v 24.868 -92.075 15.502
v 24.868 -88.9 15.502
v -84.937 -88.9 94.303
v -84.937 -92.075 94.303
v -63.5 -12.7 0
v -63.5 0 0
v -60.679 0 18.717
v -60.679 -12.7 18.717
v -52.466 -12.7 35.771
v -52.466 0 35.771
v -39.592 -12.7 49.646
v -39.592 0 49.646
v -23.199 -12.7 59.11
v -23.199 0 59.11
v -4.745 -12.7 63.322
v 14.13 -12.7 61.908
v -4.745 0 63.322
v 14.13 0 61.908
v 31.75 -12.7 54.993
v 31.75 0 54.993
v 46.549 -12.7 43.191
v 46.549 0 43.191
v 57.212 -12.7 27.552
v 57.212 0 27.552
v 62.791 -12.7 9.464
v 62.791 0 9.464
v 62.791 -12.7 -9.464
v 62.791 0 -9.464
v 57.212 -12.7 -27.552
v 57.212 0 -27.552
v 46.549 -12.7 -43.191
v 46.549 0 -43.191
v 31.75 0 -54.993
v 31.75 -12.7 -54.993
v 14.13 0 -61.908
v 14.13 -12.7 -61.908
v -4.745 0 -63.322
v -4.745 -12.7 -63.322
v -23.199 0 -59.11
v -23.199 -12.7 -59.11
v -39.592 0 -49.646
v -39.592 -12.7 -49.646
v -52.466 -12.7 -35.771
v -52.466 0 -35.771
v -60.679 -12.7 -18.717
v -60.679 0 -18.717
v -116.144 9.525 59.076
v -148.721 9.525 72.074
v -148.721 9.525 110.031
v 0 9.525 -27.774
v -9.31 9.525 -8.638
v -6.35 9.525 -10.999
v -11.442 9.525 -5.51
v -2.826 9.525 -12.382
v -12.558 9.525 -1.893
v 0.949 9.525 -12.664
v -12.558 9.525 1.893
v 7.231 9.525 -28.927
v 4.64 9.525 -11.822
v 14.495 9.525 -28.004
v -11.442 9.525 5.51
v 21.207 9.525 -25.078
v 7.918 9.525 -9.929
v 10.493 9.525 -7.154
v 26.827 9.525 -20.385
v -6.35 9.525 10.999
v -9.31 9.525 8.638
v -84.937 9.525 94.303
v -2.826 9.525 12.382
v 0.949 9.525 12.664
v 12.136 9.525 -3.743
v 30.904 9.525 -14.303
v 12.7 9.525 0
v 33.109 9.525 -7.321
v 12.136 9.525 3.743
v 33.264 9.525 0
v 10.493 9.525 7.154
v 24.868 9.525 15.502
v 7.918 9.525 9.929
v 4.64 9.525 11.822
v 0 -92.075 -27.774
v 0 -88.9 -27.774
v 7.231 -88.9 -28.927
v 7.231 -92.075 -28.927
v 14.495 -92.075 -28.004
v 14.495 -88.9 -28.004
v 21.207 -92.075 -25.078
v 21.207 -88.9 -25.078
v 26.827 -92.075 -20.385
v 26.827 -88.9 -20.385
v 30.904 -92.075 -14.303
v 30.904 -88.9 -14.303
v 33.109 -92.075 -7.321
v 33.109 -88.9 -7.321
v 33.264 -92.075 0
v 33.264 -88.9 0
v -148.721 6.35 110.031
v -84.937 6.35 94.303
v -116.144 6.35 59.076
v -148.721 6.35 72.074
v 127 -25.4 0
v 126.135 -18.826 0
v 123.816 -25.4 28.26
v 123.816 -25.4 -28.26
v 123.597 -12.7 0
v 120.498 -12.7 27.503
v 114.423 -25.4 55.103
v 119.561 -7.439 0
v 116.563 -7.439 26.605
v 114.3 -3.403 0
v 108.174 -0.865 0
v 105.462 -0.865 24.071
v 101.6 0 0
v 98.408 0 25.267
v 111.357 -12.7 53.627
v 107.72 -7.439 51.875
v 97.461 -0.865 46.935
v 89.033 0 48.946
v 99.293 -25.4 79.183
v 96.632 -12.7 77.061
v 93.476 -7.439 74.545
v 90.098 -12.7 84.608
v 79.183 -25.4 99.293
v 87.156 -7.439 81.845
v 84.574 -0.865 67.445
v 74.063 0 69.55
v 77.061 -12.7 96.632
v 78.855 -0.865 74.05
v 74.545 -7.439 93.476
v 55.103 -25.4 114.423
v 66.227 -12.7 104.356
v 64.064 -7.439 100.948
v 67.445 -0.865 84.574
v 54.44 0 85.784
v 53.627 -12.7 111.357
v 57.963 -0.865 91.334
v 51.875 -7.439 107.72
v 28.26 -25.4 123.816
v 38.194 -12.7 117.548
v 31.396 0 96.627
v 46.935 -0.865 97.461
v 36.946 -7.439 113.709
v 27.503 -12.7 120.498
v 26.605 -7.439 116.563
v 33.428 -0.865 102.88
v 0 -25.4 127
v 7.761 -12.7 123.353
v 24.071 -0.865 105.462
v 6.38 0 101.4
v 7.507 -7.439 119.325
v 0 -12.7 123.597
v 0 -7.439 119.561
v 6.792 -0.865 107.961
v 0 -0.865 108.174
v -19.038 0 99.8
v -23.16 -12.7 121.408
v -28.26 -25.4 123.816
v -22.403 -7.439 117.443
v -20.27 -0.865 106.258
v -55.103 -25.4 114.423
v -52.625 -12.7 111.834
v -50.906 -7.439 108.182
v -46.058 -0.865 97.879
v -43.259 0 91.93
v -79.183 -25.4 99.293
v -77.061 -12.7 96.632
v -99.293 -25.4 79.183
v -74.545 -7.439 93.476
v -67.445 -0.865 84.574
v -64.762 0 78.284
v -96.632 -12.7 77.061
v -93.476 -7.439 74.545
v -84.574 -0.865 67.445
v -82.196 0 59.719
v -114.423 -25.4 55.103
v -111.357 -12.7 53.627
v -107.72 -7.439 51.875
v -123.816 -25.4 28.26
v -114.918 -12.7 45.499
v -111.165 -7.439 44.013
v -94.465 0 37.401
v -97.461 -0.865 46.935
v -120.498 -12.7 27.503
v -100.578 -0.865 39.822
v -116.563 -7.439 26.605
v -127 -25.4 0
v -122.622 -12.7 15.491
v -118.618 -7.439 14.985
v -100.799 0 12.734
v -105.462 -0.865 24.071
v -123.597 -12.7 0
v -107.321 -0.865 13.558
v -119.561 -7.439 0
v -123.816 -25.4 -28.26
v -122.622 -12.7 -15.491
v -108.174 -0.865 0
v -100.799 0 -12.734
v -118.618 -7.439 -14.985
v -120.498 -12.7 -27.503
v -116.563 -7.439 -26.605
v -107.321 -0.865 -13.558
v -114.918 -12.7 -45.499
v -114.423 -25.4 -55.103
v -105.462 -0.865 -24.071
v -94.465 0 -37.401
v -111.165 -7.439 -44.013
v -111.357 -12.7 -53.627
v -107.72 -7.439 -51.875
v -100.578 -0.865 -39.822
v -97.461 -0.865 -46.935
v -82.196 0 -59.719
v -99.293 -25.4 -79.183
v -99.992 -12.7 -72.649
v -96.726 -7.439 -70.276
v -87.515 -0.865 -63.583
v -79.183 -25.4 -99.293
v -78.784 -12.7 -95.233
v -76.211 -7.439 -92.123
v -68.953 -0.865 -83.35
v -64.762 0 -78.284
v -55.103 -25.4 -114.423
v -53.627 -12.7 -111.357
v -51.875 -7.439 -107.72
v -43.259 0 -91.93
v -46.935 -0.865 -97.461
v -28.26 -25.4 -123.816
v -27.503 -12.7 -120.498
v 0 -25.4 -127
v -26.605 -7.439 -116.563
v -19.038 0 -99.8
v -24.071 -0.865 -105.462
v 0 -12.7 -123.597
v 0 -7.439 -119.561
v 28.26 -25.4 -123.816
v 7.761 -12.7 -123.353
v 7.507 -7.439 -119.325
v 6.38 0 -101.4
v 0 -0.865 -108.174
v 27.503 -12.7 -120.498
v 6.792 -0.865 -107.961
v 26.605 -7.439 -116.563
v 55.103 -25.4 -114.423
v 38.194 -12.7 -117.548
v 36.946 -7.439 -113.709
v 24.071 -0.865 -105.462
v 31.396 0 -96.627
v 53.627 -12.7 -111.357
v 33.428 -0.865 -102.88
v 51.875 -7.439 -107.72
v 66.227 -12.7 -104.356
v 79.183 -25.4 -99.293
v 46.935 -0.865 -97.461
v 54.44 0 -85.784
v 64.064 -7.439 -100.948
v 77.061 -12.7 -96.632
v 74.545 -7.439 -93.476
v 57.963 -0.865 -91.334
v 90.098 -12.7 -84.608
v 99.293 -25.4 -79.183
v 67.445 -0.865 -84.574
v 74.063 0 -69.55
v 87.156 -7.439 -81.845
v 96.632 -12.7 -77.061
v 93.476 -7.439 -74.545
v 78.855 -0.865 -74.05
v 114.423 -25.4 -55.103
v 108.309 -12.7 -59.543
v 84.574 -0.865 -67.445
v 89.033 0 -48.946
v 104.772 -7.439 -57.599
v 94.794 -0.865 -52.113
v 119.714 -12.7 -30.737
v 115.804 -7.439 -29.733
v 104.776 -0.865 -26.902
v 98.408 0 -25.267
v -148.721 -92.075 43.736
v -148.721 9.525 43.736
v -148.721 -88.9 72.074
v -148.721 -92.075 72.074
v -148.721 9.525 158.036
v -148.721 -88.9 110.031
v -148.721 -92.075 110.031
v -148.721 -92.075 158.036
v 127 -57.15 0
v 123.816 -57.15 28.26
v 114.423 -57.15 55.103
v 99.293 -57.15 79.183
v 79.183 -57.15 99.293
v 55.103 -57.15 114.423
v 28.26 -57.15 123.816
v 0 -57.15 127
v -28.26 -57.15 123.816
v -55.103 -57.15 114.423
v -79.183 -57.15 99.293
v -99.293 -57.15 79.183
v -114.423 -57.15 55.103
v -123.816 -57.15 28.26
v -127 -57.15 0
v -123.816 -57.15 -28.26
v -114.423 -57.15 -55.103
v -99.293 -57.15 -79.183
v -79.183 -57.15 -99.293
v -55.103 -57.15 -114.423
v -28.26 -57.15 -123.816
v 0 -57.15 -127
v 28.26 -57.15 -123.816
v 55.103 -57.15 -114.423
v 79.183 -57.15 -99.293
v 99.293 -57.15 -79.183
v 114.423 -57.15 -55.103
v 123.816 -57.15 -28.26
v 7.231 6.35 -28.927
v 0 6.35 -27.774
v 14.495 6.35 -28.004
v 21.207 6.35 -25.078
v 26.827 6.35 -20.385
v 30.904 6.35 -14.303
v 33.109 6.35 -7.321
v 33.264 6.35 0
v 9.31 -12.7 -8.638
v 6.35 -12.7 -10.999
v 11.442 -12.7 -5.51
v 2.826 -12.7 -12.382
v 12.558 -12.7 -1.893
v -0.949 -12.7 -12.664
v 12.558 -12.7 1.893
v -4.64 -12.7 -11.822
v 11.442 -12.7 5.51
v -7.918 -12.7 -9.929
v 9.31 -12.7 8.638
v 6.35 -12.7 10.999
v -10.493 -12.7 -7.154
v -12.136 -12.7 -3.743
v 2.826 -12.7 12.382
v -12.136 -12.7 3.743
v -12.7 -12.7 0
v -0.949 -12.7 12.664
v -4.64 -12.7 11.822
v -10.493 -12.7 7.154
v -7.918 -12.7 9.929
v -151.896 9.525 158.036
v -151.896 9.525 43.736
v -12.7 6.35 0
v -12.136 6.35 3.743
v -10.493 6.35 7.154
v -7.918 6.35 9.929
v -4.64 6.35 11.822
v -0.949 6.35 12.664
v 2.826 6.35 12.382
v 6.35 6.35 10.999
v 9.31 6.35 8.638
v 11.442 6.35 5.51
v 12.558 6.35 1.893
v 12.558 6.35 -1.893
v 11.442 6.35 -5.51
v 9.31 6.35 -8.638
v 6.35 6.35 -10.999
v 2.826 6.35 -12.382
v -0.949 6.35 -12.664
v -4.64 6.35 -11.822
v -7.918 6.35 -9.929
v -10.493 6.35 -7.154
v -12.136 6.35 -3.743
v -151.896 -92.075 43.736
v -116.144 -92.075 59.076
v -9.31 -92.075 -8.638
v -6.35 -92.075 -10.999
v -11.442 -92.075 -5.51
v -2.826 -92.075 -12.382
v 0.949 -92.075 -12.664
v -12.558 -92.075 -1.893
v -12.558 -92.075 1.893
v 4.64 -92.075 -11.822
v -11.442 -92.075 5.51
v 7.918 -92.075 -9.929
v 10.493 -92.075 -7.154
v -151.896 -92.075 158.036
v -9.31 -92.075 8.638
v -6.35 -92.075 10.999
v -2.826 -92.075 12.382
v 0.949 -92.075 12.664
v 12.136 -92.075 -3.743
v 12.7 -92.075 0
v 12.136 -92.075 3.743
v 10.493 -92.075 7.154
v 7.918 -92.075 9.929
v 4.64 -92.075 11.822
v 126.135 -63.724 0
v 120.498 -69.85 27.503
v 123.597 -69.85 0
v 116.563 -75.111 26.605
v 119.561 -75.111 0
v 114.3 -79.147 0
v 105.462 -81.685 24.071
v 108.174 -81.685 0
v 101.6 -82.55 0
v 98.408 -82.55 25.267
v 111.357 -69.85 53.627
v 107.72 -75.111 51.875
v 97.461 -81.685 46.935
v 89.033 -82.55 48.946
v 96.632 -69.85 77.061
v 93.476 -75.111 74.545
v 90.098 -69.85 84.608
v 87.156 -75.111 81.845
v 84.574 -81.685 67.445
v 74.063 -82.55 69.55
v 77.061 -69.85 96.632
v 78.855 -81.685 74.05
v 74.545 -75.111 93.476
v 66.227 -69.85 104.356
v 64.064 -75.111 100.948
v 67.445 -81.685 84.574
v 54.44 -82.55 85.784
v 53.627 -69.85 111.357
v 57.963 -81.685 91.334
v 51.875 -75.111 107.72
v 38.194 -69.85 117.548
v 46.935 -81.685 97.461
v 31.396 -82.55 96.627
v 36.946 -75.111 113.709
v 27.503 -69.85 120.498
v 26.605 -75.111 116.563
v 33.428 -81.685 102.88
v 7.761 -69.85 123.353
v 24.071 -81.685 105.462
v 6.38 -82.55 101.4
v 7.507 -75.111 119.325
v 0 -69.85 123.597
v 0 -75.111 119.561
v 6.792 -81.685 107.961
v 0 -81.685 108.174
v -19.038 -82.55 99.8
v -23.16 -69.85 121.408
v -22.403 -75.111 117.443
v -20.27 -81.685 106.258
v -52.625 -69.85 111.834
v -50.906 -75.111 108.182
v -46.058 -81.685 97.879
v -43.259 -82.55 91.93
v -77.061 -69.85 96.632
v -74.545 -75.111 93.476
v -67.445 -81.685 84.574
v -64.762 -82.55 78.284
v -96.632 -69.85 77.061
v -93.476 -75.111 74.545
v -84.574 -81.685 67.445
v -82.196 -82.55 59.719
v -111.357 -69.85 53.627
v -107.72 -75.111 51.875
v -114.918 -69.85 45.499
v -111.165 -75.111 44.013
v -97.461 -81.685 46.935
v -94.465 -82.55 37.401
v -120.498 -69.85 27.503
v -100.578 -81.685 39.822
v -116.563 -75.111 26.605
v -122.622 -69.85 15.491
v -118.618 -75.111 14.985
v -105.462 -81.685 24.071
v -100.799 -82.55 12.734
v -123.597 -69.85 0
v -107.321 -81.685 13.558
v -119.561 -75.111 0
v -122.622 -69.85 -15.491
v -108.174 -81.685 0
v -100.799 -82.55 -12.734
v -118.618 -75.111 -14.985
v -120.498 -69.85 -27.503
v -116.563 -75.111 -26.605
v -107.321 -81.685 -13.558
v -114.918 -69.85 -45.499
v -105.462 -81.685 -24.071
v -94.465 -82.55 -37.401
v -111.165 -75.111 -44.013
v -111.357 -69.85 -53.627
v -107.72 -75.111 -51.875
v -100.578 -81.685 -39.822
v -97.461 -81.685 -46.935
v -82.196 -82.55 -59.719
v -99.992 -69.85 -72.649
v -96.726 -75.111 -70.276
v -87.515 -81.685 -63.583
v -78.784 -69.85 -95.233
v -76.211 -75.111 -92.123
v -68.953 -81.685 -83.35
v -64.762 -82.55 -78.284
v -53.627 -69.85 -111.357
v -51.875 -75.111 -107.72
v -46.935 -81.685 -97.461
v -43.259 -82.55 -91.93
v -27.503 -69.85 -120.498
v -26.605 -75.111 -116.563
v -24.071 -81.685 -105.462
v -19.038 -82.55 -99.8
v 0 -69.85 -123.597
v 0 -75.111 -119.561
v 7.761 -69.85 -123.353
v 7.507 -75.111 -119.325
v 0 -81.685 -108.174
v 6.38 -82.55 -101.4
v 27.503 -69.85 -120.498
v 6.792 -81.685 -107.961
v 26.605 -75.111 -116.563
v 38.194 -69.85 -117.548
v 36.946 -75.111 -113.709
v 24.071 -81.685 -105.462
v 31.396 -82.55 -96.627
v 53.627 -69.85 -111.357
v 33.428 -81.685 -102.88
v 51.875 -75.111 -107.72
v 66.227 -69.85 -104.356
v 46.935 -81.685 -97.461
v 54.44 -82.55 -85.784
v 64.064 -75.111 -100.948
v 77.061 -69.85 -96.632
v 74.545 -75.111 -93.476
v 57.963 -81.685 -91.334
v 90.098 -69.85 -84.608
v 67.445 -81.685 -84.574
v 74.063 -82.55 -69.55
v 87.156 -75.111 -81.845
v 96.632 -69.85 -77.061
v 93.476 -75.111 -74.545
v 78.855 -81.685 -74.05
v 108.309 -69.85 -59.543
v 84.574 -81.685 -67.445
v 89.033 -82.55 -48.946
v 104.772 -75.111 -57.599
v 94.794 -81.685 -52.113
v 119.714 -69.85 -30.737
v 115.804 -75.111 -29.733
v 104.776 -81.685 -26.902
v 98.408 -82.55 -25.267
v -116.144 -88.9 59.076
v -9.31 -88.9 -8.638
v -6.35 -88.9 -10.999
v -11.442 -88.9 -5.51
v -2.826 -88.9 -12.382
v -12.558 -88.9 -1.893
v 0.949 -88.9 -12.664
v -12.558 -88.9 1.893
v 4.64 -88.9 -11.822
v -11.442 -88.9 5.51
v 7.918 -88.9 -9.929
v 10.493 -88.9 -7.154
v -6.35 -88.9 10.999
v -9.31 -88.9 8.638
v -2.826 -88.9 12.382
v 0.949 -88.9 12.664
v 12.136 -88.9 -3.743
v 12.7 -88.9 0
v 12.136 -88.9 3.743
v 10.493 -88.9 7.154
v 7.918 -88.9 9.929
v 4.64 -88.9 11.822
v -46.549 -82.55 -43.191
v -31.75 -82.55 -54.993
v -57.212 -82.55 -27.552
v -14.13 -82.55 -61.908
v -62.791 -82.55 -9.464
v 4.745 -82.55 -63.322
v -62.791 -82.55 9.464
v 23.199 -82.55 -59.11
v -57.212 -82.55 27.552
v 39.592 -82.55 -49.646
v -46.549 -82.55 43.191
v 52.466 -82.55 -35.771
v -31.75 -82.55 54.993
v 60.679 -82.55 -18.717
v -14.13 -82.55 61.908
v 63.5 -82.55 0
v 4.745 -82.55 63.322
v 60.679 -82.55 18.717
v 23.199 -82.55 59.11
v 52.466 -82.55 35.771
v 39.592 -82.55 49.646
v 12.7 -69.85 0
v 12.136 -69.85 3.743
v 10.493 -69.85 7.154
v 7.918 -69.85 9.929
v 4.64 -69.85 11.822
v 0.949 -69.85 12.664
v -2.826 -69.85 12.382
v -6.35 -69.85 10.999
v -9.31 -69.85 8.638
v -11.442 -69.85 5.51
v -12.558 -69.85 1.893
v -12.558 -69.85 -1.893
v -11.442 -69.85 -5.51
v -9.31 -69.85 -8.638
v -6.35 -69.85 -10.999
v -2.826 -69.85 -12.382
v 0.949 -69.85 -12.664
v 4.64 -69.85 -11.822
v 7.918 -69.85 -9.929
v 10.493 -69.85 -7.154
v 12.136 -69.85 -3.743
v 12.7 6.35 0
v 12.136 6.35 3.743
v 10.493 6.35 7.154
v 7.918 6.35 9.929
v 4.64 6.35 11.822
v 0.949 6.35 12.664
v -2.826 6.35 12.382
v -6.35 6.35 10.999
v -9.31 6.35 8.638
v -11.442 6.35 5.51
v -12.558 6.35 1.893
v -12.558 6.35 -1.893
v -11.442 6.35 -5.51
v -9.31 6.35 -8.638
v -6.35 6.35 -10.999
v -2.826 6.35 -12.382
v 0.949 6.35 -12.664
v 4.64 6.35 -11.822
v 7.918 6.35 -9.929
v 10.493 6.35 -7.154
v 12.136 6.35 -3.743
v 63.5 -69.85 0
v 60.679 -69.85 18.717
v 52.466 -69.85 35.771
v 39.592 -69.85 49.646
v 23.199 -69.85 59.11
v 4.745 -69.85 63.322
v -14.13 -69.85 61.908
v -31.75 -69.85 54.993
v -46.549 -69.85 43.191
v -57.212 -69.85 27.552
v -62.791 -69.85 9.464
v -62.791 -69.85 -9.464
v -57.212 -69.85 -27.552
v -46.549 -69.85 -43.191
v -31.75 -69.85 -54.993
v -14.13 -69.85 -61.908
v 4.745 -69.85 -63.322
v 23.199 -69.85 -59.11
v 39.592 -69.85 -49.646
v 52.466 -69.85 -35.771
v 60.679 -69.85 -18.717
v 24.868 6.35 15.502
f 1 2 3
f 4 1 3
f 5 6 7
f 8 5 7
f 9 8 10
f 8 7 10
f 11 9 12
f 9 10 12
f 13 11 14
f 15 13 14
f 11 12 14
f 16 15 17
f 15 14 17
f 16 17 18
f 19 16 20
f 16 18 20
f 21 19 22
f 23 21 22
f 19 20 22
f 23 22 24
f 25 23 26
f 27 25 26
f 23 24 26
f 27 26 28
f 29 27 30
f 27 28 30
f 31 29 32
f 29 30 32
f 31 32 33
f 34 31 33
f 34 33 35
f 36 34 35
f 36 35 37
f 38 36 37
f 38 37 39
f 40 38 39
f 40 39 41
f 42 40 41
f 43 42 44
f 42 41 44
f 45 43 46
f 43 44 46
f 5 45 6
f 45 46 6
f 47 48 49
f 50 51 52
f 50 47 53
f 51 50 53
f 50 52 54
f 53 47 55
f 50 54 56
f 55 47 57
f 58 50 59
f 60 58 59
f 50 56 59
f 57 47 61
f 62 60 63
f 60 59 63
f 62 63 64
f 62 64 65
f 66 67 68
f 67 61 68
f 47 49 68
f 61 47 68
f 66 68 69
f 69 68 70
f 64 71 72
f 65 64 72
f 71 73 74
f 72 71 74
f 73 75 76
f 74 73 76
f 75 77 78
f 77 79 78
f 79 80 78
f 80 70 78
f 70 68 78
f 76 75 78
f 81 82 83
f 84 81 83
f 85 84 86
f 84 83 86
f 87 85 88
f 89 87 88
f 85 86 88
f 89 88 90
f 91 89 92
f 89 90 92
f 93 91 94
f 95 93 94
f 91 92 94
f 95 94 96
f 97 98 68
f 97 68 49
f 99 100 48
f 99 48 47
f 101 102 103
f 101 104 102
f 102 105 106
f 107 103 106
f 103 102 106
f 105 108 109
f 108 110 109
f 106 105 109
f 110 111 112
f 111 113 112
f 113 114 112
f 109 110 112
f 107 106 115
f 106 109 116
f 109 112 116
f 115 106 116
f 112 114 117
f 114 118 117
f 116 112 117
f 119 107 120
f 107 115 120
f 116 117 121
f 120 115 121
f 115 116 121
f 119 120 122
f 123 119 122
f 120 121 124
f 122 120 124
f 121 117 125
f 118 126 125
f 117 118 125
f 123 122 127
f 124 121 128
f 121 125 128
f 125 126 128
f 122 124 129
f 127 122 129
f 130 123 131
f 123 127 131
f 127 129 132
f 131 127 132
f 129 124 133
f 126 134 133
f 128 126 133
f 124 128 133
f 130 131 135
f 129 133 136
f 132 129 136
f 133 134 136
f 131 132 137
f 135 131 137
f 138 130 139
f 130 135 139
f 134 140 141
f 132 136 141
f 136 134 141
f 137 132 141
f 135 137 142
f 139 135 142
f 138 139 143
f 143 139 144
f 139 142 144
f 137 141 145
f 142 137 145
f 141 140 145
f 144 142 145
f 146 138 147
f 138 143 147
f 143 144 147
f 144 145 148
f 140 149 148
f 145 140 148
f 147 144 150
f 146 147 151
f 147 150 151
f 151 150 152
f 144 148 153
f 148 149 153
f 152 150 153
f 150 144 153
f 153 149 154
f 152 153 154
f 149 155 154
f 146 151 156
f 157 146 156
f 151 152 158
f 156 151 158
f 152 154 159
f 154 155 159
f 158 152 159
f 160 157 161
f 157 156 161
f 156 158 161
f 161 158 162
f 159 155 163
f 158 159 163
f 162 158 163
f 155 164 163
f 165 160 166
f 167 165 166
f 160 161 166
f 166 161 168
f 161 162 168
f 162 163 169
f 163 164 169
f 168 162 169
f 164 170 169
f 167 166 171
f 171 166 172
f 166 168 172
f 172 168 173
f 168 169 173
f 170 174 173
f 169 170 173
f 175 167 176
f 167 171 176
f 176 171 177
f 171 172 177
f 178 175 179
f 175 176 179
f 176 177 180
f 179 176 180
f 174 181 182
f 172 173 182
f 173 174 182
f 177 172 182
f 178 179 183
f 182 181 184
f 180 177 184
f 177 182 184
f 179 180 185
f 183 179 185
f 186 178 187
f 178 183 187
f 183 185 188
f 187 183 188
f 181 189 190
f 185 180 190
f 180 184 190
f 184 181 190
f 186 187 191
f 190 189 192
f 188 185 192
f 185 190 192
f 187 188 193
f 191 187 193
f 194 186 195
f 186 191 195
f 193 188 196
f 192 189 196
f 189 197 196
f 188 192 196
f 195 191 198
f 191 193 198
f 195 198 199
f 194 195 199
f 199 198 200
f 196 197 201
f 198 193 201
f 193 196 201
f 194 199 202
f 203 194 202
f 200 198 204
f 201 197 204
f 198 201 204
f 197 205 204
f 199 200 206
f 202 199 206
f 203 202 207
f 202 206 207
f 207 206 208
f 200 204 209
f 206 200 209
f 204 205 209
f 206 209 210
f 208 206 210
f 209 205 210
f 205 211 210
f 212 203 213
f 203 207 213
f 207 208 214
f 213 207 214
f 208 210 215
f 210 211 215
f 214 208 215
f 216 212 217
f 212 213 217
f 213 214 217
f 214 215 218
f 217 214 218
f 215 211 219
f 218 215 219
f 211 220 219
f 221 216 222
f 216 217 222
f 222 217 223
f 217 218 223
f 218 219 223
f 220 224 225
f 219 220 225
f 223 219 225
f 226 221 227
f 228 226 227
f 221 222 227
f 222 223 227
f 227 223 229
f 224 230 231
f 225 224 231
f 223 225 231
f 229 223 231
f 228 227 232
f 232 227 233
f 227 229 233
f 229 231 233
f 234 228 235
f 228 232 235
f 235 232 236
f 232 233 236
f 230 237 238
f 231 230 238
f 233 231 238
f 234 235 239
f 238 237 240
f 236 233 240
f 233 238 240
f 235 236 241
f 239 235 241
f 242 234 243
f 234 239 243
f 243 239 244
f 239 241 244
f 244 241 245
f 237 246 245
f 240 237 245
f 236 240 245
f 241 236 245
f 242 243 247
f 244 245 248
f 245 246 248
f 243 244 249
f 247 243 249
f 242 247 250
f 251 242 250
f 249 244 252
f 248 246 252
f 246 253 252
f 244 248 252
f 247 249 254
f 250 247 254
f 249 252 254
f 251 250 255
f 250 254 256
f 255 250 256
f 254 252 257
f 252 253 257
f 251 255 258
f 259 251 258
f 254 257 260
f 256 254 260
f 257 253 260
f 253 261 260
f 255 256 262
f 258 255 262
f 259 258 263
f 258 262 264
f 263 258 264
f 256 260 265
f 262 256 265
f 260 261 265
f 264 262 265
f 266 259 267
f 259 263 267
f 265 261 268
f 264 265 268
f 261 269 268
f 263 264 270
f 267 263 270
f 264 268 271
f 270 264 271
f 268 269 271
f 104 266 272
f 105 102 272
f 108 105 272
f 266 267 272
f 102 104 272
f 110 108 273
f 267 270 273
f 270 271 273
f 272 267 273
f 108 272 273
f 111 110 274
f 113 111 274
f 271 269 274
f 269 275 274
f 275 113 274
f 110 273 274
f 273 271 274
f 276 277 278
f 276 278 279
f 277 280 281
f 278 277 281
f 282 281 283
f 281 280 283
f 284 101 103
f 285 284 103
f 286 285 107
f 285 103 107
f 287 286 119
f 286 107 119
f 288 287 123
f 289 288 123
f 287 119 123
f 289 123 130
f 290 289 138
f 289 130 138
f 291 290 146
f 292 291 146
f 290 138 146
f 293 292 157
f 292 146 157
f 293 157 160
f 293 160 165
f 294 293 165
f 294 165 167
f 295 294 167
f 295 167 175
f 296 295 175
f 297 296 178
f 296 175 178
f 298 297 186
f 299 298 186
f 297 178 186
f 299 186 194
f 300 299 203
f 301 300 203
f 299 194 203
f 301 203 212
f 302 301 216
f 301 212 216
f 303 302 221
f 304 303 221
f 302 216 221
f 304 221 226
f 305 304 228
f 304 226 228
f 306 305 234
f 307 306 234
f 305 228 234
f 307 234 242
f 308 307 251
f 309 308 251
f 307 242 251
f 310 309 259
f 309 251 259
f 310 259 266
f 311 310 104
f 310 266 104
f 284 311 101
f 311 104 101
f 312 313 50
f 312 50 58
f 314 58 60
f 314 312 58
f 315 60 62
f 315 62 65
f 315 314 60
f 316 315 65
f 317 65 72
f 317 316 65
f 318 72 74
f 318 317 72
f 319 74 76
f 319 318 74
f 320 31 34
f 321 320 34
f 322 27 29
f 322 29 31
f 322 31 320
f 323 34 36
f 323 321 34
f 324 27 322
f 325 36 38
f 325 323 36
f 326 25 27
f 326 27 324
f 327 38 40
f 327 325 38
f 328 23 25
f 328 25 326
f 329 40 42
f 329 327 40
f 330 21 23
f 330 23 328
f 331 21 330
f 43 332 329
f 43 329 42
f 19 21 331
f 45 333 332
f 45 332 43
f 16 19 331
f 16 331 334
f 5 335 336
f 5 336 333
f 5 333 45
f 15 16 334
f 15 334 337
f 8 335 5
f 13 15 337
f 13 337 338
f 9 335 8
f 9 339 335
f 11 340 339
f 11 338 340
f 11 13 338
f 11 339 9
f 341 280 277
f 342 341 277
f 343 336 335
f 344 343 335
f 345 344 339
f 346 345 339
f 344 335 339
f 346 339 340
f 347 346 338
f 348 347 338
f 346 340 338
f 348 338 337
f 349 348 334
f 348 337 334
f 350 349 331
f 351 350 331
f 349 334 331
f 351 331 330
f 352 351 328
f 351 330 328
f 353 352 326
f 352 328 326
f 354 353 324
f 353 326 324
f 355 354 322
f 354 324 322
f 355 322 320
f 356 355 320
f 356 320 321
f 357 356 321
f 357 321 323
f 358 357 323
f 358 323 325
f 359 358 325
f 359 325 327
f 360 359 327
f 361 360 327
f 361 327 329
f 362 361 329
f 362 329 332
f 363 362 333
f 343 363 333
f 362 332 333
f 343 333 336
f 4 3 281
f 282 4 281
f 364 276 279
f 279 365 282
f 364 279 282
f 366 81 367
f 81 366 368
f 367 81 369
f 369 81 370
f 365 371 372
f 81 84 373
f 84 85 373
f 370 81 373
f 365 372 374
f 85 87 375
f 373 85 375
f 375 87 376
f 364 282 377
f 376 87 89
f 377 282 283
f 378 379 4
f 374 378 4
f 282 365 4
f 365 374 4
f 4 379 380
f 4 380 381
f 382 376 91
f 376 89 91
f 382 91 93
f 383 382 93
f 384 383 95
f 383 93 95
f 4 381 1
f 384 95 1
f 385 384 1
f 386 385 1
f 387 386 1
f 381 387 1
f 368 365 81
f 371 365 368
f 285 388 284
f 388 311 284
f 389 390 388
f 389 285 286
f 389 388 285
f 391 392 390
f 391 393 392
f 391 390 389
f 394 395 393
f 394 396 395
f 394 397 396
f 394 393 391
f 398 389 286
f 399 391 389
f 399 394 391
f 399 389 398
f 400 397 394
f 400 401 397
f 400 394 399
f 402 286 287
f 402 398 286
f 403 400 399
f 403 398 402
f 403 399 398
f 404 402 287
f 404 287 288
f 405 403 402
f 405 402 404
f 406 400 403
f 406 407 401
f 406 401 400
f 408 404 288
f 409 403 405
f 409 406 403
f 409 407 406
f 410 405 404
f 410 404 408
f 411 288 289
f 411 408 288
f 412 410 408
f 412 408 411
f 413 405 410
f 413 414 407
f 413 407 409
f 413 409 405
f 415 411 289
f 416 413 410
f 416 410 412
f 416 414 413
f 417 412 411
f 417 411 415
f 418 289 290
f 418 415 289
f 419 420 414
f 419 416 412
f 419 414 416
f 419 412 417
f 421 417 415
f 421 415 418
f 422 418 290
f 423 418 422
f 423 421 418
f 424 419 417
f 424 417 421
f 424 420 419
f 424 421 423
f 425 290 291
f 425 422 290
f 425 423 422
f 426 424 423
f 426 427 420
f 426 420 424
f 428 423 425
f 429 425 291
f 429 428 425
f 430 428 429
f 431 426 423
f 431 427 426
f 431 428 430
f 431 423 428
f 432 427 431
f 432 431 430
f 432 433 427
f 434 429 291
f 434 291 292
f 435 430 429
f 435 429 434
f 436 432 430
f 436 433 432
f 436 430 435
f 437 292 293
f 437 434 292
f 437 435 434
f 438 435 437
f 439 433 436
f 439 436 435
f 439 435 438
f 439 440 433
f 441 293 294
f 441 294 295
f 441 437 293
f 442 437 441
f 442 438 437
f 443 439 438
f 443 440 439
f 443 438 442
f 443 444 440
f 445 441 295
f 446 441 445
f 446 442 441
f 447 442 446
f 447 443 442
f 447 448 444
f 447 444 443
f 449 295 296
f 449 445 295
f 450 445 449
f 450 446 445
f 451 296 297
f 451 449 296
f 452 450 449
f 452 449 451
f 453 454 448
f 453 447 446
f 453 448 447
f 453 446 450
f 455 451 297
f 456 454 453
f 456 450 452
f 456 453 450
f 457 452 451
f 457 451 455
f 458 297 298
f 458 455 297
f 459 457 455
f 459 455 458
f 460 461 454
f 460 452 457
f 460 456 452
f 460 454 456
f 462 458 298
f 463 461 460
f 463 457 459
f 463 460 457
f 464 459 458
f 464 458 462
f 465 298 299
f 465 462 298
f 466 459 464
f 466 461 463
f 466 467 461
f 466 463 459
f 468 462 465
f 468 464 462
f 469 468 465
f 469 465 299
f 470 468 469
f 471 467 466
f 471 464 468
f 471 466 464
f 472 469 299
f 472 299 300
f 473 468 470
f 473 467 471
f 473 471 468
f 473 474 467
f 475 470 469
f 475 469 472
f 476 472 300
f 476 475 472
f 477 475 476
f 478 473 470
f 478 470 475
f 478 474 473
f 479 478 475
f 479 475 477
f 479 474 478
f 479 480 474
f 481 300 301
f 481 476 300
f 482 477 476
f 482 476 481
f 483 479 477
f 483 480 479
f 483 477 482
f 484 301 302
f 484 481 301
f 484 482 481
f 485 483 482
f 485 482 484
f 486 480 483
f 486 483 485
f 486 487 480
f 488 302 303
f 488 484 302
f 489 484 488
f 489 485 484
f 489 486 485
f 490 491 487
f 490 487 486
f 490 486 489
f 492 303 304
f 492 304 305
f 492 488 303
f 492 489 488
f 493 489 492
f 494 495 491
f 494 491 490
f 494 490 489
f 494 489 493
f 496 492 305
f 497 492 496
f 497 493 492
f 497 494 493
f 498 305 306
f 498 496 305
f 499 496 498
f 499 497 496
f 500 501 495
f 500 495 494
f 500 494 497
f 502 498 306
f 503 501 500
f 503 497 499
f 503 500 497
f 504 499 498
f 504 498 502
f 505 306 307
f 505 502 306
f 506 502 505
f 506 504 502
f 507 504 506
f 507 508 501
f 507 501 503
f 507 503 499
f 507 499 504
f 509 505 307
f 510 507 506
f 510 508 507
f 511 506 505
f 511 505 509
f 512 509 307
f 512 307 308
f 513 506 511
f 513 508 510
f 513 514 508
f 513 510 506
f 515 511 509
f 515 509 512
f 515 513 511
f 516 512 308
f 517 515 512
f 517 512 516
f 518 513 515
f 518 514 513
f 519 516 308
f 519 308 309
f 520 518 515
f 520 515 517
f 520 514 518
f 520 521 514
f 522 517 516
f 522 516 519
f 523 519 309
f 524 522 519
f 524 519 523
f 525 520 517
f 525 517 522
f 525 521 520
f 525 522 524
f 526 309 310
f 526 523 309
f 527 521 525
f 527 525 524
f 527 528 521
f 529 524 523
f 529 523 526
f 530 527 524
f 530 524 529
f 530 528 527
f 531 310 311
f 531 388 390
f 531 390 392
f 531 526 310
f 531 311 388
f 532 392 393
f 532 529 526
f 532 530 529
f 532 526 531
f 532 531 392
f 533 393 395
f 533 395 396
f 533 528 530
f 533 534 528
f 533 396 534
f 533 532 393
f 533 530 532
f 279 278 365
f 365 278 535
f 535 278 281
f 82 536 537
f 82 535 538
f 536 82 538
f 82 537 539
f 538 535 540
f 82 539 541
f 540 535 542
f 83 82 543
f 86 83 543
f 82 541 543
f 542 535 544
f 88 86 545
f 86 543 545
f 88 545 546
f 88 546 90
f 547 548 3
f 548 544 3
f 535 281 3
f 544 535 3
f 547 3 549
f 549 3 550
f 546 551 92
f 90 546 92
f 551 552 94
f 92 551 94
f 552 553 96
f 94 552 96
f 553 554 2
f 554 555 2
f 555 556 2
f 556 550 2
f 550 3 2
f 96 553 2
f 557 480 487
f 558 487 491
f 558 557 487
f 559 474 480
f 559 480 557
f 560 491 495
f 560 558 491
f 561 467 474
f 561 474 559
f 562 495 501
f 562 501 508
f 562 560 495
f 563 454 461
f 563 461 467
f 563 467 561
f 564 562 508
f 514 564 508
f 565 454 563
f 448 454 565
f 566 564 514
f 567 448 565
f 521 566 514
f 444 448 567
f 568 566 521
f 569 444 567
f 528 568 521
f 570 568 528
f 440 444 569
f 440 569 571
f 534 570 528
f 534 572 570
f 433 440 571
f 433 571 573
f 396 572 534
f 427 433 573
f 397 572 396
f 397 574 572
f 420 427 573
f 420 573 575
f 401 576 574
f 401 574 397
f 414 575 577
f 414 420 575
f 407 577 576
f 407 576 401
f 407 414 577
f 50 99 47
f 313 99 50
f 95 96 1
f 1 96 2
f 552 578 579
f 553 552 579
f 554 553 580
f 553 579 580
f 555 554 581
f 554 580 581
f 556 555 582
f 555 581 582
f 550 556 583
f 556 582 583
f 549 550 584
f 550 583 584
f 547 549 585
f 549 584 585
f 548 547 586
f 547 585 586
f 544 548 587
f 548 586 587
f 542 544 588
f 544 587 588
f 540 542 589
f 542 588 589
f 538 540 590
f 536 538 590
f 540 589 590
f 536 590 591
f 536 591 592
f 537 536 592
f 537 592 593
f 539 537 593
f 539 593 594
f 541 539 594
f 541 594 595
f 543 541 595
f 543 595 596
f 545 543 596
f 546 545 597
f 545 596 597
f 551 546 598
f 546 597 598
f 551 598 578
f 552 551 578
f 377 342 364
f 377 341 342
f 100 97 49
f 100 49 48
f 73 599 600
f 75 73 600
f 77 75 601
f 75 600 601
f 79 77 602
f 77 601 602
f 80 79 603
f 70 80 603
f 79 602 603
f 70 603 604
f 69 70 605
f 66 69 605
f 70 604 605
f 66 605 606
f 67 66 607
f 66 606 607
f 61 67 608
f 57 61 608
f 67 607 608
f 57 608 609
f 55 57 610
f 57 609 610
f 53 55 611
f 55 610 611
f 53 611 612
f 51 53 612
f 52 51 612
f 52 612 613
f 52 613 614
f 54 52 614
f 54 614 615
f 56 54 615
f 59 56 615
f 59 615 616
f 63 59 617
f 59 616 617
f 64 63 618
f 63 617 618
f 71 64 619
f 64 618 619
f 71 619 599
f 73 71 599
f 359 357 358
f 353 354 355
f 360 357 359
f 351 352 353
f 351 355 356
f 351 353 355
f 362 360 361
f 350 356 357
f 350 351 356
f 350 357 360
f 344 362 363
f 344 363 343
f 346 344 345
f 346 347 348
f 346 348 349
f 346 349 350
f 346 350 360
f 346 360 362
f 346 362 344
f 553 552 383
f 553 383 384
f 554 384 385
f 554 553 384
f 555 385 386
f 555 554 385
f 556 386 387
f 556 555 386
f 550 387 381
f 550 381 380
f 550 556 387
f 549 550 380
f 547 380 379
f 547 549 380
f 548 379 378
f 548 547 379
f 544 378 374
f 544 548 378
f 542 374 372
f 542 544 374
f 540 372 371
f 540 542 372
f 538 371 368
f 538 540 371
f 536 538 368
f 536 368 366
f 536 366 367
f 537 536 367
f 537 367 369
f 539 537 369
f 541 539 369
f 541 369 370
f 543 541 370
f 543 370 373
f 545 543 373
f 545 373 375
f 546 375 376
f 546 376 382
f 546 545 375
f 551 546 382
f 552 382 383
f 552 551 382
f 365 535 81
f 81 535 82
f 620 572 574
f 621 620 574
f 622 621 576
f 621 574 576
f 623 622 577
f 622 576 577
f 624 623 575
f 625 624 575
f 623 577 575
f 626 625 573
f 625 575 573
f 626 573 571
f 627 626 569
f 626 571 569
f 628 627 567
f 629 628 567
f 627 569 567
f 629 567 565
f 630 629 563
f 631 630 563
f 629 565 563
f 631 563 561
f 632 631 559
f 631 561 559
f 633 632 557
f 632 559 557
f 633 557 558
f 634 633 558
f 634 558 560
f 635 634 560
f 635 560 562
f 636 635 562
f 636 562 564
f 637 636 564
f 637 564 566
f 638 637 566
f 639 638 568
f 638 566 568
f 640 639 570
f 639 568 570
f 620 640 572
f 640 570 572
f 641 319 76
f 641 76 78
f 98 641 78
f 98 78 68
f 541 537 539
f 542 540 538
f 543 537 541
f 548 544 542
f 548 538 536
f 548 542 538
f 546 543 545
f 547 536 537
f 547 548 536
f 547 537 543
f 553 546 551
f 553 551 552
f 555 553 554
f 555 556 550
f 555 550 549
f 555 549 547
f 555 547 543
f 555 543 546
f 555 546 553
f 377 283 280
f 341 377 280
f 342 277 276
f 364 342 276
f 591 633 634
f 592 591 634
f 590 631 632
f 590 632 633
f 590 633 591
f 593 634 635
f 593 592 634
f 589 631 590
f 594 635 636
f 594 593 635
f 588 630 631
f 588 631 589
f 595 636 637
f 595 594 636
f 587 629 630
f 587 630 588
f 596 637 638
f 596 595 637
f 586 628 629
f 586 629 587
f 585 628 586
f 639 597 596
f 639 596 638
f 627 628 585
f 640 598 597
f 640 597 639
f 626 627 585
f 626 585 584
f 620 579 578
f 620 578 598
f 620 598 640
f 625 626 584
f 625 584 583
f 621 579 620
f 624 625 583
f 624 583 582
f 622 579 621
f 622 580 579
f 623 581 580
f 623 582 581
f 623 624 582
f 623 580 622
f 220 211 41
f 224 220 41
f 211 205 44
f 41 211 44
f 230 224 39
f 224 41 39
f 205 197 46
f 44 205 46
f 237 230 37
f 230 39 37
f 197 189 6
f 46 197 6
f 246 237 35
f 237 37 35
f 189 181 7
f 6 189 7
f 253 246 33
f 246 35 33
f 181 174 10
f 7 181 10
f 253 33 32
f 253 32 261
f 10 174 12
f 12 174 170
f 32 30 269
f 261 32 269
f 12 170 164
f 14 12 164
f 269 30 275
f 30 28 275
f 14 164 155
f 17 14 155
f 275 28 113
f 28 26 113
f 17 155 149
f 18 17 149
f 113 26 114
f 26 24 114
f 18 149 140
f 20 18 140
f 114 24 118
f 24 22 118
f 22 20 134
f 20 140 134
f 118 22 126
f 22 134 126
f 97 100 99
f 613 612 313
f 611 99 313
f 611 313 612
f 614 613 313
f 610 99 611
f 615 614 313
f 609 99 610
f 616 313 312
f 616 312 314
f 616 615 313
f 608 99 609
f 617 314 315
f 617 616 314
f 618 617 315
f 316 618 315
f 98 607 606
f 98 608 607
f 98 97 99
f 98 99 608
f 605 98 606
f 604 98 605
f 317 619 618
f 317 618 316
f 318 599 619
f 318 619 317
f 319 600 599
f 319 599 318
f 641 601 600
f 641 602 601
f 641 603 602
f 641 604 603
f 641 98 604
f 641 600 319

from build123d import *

# Parameters (mm, degrees)
F0_R      = 127
F1_DEPTH  = 82.55
F2_R      = 25.4
F3_R      = 63.5
F4_DEPTH  = 12.7
F5_R      = 63.5
F7_DEPTH  = 12.7
F8_R      = 12.7
F9_DEPTH  = 19.05
F10_R     = 12.7
F11_DEPTH = 19.05
F12_R     = 12.7
F13_DEPTH = 3.175
F15_W     = 3.175
F15_H     = 37.9564044358
F16_DEPTH = 3.175


# Not quite as in the source:
# - a length typed as a fraction of an inch, garbled in the dataset ("3 / 203.2 mm" for 3/8 in), is restored


with BuildPart() as f1:
    # F0 (on Front) → F1 (new body)
    with BuildSketch(Plane.XZ):
        Circle(F0_R)
    extrude(amount=F1_DEPTH)

    # F2
    f2_edges = [f1.edges().sort_by_distance(p)[0] for p in [
        (-127, 0, 0),
        (-127, -82.55, 0),
    ]]
    fillet(f2_edges, radius=F2_R)

    # F3 (on face) → F4 (cut)
    with BuildSketch(Plane.XZ.offset(82.55)):
        Circle(F3_R)
    extrude(amount=-F4_DEPTH, mode=Mode.SUBTRACT)

    # F5 (on face) → F7 (cut)
    with BuildSketch(Plane(origin=(0, 0, 0), x_dir=(-1, 0, 0), z_dir=(0, 1, 0))):
        Circle(F5_R)
    extrude(amount=-F7_DEPTH, mode=Mode.SUBTRACT)

    # F8 (on face) → F9 (join)
    with BuildSketch(Plane(origin=(0, -12.7, 0), x_dir=(-1, 0, 0), z_dir=(0, 1, 0))):
        Circle(F8_R)
    extrude(amount=F9_DEPTH)

    # F10 (on face) → F11 (join)
    with BuildSketch(Plane.XZ.offset(69.85)):
        Circle(F10_R)
    extrude(amount=F11_DEPTH)


with BuildPart() as f13:
    # F12 (on face) → F13 (new body)
    with BuildSketch(Plane.XZ.offset(88.9)):
        with BuildLine():
            Line((-116.1441206932, 59.0758956969), (0, -27.7741849422))
            ThreePointArc((0, -27.7741849422), (24.1842527019, -22.9319763652), (33.2644246519, 0))
            Line((33.2644246519, 0), (24.8675793409, 15.5018689111))
            Line((24.8675793409, 15.5018689111), (-84.9373340607, 94.303034246))
            Line((-84.9373340607, 94.303034246), (-148.7210690975, 110.0305374596))
            Line((-148.7210690975, 110.0305374596), (-148.7210690975, 72.0741330239))
            Line((-148.7210690975, 72.0741330239), (-116.1441206932, 59.0758956969))
        make_face()
        Circle(F12_R, mode=Mode.SUBTRACT)
    extrude(amount=F13_DEPTH)


with BuildPart() as f14_1:
    # F14: instance of F13
    add(f13.part.mirror(Plane.XZ.offset(41.275)))


with BuildPart() as f13_1:
    add(f13.part)

    # F15 (on face) → F16 (join)
    with BuildSketch(Plane(origin=(-148.7210690975, 0, 0), x_dir=(0, -1, 0), z_dir=(-1, 0, 0))):
        Polygon((-9.525, 72.0741330239), (-9.525, 43.7358616628), (92.075, 43.7358616628), (92.075, 158.0358616628), (-9.525, 158.0358616628), (-9.525, 110.0305374596), (-6.35, 110.0305374596), (-6.35, 72.0741330239), align=None)
        with Locations((-7.9375, 91.0523352418)):
            Rectangle(F15_W, F15_H)
    extrude(amount=F16_DEPTH)


solid = Compound([f1.part, f14_1.part, f13_1.part])
